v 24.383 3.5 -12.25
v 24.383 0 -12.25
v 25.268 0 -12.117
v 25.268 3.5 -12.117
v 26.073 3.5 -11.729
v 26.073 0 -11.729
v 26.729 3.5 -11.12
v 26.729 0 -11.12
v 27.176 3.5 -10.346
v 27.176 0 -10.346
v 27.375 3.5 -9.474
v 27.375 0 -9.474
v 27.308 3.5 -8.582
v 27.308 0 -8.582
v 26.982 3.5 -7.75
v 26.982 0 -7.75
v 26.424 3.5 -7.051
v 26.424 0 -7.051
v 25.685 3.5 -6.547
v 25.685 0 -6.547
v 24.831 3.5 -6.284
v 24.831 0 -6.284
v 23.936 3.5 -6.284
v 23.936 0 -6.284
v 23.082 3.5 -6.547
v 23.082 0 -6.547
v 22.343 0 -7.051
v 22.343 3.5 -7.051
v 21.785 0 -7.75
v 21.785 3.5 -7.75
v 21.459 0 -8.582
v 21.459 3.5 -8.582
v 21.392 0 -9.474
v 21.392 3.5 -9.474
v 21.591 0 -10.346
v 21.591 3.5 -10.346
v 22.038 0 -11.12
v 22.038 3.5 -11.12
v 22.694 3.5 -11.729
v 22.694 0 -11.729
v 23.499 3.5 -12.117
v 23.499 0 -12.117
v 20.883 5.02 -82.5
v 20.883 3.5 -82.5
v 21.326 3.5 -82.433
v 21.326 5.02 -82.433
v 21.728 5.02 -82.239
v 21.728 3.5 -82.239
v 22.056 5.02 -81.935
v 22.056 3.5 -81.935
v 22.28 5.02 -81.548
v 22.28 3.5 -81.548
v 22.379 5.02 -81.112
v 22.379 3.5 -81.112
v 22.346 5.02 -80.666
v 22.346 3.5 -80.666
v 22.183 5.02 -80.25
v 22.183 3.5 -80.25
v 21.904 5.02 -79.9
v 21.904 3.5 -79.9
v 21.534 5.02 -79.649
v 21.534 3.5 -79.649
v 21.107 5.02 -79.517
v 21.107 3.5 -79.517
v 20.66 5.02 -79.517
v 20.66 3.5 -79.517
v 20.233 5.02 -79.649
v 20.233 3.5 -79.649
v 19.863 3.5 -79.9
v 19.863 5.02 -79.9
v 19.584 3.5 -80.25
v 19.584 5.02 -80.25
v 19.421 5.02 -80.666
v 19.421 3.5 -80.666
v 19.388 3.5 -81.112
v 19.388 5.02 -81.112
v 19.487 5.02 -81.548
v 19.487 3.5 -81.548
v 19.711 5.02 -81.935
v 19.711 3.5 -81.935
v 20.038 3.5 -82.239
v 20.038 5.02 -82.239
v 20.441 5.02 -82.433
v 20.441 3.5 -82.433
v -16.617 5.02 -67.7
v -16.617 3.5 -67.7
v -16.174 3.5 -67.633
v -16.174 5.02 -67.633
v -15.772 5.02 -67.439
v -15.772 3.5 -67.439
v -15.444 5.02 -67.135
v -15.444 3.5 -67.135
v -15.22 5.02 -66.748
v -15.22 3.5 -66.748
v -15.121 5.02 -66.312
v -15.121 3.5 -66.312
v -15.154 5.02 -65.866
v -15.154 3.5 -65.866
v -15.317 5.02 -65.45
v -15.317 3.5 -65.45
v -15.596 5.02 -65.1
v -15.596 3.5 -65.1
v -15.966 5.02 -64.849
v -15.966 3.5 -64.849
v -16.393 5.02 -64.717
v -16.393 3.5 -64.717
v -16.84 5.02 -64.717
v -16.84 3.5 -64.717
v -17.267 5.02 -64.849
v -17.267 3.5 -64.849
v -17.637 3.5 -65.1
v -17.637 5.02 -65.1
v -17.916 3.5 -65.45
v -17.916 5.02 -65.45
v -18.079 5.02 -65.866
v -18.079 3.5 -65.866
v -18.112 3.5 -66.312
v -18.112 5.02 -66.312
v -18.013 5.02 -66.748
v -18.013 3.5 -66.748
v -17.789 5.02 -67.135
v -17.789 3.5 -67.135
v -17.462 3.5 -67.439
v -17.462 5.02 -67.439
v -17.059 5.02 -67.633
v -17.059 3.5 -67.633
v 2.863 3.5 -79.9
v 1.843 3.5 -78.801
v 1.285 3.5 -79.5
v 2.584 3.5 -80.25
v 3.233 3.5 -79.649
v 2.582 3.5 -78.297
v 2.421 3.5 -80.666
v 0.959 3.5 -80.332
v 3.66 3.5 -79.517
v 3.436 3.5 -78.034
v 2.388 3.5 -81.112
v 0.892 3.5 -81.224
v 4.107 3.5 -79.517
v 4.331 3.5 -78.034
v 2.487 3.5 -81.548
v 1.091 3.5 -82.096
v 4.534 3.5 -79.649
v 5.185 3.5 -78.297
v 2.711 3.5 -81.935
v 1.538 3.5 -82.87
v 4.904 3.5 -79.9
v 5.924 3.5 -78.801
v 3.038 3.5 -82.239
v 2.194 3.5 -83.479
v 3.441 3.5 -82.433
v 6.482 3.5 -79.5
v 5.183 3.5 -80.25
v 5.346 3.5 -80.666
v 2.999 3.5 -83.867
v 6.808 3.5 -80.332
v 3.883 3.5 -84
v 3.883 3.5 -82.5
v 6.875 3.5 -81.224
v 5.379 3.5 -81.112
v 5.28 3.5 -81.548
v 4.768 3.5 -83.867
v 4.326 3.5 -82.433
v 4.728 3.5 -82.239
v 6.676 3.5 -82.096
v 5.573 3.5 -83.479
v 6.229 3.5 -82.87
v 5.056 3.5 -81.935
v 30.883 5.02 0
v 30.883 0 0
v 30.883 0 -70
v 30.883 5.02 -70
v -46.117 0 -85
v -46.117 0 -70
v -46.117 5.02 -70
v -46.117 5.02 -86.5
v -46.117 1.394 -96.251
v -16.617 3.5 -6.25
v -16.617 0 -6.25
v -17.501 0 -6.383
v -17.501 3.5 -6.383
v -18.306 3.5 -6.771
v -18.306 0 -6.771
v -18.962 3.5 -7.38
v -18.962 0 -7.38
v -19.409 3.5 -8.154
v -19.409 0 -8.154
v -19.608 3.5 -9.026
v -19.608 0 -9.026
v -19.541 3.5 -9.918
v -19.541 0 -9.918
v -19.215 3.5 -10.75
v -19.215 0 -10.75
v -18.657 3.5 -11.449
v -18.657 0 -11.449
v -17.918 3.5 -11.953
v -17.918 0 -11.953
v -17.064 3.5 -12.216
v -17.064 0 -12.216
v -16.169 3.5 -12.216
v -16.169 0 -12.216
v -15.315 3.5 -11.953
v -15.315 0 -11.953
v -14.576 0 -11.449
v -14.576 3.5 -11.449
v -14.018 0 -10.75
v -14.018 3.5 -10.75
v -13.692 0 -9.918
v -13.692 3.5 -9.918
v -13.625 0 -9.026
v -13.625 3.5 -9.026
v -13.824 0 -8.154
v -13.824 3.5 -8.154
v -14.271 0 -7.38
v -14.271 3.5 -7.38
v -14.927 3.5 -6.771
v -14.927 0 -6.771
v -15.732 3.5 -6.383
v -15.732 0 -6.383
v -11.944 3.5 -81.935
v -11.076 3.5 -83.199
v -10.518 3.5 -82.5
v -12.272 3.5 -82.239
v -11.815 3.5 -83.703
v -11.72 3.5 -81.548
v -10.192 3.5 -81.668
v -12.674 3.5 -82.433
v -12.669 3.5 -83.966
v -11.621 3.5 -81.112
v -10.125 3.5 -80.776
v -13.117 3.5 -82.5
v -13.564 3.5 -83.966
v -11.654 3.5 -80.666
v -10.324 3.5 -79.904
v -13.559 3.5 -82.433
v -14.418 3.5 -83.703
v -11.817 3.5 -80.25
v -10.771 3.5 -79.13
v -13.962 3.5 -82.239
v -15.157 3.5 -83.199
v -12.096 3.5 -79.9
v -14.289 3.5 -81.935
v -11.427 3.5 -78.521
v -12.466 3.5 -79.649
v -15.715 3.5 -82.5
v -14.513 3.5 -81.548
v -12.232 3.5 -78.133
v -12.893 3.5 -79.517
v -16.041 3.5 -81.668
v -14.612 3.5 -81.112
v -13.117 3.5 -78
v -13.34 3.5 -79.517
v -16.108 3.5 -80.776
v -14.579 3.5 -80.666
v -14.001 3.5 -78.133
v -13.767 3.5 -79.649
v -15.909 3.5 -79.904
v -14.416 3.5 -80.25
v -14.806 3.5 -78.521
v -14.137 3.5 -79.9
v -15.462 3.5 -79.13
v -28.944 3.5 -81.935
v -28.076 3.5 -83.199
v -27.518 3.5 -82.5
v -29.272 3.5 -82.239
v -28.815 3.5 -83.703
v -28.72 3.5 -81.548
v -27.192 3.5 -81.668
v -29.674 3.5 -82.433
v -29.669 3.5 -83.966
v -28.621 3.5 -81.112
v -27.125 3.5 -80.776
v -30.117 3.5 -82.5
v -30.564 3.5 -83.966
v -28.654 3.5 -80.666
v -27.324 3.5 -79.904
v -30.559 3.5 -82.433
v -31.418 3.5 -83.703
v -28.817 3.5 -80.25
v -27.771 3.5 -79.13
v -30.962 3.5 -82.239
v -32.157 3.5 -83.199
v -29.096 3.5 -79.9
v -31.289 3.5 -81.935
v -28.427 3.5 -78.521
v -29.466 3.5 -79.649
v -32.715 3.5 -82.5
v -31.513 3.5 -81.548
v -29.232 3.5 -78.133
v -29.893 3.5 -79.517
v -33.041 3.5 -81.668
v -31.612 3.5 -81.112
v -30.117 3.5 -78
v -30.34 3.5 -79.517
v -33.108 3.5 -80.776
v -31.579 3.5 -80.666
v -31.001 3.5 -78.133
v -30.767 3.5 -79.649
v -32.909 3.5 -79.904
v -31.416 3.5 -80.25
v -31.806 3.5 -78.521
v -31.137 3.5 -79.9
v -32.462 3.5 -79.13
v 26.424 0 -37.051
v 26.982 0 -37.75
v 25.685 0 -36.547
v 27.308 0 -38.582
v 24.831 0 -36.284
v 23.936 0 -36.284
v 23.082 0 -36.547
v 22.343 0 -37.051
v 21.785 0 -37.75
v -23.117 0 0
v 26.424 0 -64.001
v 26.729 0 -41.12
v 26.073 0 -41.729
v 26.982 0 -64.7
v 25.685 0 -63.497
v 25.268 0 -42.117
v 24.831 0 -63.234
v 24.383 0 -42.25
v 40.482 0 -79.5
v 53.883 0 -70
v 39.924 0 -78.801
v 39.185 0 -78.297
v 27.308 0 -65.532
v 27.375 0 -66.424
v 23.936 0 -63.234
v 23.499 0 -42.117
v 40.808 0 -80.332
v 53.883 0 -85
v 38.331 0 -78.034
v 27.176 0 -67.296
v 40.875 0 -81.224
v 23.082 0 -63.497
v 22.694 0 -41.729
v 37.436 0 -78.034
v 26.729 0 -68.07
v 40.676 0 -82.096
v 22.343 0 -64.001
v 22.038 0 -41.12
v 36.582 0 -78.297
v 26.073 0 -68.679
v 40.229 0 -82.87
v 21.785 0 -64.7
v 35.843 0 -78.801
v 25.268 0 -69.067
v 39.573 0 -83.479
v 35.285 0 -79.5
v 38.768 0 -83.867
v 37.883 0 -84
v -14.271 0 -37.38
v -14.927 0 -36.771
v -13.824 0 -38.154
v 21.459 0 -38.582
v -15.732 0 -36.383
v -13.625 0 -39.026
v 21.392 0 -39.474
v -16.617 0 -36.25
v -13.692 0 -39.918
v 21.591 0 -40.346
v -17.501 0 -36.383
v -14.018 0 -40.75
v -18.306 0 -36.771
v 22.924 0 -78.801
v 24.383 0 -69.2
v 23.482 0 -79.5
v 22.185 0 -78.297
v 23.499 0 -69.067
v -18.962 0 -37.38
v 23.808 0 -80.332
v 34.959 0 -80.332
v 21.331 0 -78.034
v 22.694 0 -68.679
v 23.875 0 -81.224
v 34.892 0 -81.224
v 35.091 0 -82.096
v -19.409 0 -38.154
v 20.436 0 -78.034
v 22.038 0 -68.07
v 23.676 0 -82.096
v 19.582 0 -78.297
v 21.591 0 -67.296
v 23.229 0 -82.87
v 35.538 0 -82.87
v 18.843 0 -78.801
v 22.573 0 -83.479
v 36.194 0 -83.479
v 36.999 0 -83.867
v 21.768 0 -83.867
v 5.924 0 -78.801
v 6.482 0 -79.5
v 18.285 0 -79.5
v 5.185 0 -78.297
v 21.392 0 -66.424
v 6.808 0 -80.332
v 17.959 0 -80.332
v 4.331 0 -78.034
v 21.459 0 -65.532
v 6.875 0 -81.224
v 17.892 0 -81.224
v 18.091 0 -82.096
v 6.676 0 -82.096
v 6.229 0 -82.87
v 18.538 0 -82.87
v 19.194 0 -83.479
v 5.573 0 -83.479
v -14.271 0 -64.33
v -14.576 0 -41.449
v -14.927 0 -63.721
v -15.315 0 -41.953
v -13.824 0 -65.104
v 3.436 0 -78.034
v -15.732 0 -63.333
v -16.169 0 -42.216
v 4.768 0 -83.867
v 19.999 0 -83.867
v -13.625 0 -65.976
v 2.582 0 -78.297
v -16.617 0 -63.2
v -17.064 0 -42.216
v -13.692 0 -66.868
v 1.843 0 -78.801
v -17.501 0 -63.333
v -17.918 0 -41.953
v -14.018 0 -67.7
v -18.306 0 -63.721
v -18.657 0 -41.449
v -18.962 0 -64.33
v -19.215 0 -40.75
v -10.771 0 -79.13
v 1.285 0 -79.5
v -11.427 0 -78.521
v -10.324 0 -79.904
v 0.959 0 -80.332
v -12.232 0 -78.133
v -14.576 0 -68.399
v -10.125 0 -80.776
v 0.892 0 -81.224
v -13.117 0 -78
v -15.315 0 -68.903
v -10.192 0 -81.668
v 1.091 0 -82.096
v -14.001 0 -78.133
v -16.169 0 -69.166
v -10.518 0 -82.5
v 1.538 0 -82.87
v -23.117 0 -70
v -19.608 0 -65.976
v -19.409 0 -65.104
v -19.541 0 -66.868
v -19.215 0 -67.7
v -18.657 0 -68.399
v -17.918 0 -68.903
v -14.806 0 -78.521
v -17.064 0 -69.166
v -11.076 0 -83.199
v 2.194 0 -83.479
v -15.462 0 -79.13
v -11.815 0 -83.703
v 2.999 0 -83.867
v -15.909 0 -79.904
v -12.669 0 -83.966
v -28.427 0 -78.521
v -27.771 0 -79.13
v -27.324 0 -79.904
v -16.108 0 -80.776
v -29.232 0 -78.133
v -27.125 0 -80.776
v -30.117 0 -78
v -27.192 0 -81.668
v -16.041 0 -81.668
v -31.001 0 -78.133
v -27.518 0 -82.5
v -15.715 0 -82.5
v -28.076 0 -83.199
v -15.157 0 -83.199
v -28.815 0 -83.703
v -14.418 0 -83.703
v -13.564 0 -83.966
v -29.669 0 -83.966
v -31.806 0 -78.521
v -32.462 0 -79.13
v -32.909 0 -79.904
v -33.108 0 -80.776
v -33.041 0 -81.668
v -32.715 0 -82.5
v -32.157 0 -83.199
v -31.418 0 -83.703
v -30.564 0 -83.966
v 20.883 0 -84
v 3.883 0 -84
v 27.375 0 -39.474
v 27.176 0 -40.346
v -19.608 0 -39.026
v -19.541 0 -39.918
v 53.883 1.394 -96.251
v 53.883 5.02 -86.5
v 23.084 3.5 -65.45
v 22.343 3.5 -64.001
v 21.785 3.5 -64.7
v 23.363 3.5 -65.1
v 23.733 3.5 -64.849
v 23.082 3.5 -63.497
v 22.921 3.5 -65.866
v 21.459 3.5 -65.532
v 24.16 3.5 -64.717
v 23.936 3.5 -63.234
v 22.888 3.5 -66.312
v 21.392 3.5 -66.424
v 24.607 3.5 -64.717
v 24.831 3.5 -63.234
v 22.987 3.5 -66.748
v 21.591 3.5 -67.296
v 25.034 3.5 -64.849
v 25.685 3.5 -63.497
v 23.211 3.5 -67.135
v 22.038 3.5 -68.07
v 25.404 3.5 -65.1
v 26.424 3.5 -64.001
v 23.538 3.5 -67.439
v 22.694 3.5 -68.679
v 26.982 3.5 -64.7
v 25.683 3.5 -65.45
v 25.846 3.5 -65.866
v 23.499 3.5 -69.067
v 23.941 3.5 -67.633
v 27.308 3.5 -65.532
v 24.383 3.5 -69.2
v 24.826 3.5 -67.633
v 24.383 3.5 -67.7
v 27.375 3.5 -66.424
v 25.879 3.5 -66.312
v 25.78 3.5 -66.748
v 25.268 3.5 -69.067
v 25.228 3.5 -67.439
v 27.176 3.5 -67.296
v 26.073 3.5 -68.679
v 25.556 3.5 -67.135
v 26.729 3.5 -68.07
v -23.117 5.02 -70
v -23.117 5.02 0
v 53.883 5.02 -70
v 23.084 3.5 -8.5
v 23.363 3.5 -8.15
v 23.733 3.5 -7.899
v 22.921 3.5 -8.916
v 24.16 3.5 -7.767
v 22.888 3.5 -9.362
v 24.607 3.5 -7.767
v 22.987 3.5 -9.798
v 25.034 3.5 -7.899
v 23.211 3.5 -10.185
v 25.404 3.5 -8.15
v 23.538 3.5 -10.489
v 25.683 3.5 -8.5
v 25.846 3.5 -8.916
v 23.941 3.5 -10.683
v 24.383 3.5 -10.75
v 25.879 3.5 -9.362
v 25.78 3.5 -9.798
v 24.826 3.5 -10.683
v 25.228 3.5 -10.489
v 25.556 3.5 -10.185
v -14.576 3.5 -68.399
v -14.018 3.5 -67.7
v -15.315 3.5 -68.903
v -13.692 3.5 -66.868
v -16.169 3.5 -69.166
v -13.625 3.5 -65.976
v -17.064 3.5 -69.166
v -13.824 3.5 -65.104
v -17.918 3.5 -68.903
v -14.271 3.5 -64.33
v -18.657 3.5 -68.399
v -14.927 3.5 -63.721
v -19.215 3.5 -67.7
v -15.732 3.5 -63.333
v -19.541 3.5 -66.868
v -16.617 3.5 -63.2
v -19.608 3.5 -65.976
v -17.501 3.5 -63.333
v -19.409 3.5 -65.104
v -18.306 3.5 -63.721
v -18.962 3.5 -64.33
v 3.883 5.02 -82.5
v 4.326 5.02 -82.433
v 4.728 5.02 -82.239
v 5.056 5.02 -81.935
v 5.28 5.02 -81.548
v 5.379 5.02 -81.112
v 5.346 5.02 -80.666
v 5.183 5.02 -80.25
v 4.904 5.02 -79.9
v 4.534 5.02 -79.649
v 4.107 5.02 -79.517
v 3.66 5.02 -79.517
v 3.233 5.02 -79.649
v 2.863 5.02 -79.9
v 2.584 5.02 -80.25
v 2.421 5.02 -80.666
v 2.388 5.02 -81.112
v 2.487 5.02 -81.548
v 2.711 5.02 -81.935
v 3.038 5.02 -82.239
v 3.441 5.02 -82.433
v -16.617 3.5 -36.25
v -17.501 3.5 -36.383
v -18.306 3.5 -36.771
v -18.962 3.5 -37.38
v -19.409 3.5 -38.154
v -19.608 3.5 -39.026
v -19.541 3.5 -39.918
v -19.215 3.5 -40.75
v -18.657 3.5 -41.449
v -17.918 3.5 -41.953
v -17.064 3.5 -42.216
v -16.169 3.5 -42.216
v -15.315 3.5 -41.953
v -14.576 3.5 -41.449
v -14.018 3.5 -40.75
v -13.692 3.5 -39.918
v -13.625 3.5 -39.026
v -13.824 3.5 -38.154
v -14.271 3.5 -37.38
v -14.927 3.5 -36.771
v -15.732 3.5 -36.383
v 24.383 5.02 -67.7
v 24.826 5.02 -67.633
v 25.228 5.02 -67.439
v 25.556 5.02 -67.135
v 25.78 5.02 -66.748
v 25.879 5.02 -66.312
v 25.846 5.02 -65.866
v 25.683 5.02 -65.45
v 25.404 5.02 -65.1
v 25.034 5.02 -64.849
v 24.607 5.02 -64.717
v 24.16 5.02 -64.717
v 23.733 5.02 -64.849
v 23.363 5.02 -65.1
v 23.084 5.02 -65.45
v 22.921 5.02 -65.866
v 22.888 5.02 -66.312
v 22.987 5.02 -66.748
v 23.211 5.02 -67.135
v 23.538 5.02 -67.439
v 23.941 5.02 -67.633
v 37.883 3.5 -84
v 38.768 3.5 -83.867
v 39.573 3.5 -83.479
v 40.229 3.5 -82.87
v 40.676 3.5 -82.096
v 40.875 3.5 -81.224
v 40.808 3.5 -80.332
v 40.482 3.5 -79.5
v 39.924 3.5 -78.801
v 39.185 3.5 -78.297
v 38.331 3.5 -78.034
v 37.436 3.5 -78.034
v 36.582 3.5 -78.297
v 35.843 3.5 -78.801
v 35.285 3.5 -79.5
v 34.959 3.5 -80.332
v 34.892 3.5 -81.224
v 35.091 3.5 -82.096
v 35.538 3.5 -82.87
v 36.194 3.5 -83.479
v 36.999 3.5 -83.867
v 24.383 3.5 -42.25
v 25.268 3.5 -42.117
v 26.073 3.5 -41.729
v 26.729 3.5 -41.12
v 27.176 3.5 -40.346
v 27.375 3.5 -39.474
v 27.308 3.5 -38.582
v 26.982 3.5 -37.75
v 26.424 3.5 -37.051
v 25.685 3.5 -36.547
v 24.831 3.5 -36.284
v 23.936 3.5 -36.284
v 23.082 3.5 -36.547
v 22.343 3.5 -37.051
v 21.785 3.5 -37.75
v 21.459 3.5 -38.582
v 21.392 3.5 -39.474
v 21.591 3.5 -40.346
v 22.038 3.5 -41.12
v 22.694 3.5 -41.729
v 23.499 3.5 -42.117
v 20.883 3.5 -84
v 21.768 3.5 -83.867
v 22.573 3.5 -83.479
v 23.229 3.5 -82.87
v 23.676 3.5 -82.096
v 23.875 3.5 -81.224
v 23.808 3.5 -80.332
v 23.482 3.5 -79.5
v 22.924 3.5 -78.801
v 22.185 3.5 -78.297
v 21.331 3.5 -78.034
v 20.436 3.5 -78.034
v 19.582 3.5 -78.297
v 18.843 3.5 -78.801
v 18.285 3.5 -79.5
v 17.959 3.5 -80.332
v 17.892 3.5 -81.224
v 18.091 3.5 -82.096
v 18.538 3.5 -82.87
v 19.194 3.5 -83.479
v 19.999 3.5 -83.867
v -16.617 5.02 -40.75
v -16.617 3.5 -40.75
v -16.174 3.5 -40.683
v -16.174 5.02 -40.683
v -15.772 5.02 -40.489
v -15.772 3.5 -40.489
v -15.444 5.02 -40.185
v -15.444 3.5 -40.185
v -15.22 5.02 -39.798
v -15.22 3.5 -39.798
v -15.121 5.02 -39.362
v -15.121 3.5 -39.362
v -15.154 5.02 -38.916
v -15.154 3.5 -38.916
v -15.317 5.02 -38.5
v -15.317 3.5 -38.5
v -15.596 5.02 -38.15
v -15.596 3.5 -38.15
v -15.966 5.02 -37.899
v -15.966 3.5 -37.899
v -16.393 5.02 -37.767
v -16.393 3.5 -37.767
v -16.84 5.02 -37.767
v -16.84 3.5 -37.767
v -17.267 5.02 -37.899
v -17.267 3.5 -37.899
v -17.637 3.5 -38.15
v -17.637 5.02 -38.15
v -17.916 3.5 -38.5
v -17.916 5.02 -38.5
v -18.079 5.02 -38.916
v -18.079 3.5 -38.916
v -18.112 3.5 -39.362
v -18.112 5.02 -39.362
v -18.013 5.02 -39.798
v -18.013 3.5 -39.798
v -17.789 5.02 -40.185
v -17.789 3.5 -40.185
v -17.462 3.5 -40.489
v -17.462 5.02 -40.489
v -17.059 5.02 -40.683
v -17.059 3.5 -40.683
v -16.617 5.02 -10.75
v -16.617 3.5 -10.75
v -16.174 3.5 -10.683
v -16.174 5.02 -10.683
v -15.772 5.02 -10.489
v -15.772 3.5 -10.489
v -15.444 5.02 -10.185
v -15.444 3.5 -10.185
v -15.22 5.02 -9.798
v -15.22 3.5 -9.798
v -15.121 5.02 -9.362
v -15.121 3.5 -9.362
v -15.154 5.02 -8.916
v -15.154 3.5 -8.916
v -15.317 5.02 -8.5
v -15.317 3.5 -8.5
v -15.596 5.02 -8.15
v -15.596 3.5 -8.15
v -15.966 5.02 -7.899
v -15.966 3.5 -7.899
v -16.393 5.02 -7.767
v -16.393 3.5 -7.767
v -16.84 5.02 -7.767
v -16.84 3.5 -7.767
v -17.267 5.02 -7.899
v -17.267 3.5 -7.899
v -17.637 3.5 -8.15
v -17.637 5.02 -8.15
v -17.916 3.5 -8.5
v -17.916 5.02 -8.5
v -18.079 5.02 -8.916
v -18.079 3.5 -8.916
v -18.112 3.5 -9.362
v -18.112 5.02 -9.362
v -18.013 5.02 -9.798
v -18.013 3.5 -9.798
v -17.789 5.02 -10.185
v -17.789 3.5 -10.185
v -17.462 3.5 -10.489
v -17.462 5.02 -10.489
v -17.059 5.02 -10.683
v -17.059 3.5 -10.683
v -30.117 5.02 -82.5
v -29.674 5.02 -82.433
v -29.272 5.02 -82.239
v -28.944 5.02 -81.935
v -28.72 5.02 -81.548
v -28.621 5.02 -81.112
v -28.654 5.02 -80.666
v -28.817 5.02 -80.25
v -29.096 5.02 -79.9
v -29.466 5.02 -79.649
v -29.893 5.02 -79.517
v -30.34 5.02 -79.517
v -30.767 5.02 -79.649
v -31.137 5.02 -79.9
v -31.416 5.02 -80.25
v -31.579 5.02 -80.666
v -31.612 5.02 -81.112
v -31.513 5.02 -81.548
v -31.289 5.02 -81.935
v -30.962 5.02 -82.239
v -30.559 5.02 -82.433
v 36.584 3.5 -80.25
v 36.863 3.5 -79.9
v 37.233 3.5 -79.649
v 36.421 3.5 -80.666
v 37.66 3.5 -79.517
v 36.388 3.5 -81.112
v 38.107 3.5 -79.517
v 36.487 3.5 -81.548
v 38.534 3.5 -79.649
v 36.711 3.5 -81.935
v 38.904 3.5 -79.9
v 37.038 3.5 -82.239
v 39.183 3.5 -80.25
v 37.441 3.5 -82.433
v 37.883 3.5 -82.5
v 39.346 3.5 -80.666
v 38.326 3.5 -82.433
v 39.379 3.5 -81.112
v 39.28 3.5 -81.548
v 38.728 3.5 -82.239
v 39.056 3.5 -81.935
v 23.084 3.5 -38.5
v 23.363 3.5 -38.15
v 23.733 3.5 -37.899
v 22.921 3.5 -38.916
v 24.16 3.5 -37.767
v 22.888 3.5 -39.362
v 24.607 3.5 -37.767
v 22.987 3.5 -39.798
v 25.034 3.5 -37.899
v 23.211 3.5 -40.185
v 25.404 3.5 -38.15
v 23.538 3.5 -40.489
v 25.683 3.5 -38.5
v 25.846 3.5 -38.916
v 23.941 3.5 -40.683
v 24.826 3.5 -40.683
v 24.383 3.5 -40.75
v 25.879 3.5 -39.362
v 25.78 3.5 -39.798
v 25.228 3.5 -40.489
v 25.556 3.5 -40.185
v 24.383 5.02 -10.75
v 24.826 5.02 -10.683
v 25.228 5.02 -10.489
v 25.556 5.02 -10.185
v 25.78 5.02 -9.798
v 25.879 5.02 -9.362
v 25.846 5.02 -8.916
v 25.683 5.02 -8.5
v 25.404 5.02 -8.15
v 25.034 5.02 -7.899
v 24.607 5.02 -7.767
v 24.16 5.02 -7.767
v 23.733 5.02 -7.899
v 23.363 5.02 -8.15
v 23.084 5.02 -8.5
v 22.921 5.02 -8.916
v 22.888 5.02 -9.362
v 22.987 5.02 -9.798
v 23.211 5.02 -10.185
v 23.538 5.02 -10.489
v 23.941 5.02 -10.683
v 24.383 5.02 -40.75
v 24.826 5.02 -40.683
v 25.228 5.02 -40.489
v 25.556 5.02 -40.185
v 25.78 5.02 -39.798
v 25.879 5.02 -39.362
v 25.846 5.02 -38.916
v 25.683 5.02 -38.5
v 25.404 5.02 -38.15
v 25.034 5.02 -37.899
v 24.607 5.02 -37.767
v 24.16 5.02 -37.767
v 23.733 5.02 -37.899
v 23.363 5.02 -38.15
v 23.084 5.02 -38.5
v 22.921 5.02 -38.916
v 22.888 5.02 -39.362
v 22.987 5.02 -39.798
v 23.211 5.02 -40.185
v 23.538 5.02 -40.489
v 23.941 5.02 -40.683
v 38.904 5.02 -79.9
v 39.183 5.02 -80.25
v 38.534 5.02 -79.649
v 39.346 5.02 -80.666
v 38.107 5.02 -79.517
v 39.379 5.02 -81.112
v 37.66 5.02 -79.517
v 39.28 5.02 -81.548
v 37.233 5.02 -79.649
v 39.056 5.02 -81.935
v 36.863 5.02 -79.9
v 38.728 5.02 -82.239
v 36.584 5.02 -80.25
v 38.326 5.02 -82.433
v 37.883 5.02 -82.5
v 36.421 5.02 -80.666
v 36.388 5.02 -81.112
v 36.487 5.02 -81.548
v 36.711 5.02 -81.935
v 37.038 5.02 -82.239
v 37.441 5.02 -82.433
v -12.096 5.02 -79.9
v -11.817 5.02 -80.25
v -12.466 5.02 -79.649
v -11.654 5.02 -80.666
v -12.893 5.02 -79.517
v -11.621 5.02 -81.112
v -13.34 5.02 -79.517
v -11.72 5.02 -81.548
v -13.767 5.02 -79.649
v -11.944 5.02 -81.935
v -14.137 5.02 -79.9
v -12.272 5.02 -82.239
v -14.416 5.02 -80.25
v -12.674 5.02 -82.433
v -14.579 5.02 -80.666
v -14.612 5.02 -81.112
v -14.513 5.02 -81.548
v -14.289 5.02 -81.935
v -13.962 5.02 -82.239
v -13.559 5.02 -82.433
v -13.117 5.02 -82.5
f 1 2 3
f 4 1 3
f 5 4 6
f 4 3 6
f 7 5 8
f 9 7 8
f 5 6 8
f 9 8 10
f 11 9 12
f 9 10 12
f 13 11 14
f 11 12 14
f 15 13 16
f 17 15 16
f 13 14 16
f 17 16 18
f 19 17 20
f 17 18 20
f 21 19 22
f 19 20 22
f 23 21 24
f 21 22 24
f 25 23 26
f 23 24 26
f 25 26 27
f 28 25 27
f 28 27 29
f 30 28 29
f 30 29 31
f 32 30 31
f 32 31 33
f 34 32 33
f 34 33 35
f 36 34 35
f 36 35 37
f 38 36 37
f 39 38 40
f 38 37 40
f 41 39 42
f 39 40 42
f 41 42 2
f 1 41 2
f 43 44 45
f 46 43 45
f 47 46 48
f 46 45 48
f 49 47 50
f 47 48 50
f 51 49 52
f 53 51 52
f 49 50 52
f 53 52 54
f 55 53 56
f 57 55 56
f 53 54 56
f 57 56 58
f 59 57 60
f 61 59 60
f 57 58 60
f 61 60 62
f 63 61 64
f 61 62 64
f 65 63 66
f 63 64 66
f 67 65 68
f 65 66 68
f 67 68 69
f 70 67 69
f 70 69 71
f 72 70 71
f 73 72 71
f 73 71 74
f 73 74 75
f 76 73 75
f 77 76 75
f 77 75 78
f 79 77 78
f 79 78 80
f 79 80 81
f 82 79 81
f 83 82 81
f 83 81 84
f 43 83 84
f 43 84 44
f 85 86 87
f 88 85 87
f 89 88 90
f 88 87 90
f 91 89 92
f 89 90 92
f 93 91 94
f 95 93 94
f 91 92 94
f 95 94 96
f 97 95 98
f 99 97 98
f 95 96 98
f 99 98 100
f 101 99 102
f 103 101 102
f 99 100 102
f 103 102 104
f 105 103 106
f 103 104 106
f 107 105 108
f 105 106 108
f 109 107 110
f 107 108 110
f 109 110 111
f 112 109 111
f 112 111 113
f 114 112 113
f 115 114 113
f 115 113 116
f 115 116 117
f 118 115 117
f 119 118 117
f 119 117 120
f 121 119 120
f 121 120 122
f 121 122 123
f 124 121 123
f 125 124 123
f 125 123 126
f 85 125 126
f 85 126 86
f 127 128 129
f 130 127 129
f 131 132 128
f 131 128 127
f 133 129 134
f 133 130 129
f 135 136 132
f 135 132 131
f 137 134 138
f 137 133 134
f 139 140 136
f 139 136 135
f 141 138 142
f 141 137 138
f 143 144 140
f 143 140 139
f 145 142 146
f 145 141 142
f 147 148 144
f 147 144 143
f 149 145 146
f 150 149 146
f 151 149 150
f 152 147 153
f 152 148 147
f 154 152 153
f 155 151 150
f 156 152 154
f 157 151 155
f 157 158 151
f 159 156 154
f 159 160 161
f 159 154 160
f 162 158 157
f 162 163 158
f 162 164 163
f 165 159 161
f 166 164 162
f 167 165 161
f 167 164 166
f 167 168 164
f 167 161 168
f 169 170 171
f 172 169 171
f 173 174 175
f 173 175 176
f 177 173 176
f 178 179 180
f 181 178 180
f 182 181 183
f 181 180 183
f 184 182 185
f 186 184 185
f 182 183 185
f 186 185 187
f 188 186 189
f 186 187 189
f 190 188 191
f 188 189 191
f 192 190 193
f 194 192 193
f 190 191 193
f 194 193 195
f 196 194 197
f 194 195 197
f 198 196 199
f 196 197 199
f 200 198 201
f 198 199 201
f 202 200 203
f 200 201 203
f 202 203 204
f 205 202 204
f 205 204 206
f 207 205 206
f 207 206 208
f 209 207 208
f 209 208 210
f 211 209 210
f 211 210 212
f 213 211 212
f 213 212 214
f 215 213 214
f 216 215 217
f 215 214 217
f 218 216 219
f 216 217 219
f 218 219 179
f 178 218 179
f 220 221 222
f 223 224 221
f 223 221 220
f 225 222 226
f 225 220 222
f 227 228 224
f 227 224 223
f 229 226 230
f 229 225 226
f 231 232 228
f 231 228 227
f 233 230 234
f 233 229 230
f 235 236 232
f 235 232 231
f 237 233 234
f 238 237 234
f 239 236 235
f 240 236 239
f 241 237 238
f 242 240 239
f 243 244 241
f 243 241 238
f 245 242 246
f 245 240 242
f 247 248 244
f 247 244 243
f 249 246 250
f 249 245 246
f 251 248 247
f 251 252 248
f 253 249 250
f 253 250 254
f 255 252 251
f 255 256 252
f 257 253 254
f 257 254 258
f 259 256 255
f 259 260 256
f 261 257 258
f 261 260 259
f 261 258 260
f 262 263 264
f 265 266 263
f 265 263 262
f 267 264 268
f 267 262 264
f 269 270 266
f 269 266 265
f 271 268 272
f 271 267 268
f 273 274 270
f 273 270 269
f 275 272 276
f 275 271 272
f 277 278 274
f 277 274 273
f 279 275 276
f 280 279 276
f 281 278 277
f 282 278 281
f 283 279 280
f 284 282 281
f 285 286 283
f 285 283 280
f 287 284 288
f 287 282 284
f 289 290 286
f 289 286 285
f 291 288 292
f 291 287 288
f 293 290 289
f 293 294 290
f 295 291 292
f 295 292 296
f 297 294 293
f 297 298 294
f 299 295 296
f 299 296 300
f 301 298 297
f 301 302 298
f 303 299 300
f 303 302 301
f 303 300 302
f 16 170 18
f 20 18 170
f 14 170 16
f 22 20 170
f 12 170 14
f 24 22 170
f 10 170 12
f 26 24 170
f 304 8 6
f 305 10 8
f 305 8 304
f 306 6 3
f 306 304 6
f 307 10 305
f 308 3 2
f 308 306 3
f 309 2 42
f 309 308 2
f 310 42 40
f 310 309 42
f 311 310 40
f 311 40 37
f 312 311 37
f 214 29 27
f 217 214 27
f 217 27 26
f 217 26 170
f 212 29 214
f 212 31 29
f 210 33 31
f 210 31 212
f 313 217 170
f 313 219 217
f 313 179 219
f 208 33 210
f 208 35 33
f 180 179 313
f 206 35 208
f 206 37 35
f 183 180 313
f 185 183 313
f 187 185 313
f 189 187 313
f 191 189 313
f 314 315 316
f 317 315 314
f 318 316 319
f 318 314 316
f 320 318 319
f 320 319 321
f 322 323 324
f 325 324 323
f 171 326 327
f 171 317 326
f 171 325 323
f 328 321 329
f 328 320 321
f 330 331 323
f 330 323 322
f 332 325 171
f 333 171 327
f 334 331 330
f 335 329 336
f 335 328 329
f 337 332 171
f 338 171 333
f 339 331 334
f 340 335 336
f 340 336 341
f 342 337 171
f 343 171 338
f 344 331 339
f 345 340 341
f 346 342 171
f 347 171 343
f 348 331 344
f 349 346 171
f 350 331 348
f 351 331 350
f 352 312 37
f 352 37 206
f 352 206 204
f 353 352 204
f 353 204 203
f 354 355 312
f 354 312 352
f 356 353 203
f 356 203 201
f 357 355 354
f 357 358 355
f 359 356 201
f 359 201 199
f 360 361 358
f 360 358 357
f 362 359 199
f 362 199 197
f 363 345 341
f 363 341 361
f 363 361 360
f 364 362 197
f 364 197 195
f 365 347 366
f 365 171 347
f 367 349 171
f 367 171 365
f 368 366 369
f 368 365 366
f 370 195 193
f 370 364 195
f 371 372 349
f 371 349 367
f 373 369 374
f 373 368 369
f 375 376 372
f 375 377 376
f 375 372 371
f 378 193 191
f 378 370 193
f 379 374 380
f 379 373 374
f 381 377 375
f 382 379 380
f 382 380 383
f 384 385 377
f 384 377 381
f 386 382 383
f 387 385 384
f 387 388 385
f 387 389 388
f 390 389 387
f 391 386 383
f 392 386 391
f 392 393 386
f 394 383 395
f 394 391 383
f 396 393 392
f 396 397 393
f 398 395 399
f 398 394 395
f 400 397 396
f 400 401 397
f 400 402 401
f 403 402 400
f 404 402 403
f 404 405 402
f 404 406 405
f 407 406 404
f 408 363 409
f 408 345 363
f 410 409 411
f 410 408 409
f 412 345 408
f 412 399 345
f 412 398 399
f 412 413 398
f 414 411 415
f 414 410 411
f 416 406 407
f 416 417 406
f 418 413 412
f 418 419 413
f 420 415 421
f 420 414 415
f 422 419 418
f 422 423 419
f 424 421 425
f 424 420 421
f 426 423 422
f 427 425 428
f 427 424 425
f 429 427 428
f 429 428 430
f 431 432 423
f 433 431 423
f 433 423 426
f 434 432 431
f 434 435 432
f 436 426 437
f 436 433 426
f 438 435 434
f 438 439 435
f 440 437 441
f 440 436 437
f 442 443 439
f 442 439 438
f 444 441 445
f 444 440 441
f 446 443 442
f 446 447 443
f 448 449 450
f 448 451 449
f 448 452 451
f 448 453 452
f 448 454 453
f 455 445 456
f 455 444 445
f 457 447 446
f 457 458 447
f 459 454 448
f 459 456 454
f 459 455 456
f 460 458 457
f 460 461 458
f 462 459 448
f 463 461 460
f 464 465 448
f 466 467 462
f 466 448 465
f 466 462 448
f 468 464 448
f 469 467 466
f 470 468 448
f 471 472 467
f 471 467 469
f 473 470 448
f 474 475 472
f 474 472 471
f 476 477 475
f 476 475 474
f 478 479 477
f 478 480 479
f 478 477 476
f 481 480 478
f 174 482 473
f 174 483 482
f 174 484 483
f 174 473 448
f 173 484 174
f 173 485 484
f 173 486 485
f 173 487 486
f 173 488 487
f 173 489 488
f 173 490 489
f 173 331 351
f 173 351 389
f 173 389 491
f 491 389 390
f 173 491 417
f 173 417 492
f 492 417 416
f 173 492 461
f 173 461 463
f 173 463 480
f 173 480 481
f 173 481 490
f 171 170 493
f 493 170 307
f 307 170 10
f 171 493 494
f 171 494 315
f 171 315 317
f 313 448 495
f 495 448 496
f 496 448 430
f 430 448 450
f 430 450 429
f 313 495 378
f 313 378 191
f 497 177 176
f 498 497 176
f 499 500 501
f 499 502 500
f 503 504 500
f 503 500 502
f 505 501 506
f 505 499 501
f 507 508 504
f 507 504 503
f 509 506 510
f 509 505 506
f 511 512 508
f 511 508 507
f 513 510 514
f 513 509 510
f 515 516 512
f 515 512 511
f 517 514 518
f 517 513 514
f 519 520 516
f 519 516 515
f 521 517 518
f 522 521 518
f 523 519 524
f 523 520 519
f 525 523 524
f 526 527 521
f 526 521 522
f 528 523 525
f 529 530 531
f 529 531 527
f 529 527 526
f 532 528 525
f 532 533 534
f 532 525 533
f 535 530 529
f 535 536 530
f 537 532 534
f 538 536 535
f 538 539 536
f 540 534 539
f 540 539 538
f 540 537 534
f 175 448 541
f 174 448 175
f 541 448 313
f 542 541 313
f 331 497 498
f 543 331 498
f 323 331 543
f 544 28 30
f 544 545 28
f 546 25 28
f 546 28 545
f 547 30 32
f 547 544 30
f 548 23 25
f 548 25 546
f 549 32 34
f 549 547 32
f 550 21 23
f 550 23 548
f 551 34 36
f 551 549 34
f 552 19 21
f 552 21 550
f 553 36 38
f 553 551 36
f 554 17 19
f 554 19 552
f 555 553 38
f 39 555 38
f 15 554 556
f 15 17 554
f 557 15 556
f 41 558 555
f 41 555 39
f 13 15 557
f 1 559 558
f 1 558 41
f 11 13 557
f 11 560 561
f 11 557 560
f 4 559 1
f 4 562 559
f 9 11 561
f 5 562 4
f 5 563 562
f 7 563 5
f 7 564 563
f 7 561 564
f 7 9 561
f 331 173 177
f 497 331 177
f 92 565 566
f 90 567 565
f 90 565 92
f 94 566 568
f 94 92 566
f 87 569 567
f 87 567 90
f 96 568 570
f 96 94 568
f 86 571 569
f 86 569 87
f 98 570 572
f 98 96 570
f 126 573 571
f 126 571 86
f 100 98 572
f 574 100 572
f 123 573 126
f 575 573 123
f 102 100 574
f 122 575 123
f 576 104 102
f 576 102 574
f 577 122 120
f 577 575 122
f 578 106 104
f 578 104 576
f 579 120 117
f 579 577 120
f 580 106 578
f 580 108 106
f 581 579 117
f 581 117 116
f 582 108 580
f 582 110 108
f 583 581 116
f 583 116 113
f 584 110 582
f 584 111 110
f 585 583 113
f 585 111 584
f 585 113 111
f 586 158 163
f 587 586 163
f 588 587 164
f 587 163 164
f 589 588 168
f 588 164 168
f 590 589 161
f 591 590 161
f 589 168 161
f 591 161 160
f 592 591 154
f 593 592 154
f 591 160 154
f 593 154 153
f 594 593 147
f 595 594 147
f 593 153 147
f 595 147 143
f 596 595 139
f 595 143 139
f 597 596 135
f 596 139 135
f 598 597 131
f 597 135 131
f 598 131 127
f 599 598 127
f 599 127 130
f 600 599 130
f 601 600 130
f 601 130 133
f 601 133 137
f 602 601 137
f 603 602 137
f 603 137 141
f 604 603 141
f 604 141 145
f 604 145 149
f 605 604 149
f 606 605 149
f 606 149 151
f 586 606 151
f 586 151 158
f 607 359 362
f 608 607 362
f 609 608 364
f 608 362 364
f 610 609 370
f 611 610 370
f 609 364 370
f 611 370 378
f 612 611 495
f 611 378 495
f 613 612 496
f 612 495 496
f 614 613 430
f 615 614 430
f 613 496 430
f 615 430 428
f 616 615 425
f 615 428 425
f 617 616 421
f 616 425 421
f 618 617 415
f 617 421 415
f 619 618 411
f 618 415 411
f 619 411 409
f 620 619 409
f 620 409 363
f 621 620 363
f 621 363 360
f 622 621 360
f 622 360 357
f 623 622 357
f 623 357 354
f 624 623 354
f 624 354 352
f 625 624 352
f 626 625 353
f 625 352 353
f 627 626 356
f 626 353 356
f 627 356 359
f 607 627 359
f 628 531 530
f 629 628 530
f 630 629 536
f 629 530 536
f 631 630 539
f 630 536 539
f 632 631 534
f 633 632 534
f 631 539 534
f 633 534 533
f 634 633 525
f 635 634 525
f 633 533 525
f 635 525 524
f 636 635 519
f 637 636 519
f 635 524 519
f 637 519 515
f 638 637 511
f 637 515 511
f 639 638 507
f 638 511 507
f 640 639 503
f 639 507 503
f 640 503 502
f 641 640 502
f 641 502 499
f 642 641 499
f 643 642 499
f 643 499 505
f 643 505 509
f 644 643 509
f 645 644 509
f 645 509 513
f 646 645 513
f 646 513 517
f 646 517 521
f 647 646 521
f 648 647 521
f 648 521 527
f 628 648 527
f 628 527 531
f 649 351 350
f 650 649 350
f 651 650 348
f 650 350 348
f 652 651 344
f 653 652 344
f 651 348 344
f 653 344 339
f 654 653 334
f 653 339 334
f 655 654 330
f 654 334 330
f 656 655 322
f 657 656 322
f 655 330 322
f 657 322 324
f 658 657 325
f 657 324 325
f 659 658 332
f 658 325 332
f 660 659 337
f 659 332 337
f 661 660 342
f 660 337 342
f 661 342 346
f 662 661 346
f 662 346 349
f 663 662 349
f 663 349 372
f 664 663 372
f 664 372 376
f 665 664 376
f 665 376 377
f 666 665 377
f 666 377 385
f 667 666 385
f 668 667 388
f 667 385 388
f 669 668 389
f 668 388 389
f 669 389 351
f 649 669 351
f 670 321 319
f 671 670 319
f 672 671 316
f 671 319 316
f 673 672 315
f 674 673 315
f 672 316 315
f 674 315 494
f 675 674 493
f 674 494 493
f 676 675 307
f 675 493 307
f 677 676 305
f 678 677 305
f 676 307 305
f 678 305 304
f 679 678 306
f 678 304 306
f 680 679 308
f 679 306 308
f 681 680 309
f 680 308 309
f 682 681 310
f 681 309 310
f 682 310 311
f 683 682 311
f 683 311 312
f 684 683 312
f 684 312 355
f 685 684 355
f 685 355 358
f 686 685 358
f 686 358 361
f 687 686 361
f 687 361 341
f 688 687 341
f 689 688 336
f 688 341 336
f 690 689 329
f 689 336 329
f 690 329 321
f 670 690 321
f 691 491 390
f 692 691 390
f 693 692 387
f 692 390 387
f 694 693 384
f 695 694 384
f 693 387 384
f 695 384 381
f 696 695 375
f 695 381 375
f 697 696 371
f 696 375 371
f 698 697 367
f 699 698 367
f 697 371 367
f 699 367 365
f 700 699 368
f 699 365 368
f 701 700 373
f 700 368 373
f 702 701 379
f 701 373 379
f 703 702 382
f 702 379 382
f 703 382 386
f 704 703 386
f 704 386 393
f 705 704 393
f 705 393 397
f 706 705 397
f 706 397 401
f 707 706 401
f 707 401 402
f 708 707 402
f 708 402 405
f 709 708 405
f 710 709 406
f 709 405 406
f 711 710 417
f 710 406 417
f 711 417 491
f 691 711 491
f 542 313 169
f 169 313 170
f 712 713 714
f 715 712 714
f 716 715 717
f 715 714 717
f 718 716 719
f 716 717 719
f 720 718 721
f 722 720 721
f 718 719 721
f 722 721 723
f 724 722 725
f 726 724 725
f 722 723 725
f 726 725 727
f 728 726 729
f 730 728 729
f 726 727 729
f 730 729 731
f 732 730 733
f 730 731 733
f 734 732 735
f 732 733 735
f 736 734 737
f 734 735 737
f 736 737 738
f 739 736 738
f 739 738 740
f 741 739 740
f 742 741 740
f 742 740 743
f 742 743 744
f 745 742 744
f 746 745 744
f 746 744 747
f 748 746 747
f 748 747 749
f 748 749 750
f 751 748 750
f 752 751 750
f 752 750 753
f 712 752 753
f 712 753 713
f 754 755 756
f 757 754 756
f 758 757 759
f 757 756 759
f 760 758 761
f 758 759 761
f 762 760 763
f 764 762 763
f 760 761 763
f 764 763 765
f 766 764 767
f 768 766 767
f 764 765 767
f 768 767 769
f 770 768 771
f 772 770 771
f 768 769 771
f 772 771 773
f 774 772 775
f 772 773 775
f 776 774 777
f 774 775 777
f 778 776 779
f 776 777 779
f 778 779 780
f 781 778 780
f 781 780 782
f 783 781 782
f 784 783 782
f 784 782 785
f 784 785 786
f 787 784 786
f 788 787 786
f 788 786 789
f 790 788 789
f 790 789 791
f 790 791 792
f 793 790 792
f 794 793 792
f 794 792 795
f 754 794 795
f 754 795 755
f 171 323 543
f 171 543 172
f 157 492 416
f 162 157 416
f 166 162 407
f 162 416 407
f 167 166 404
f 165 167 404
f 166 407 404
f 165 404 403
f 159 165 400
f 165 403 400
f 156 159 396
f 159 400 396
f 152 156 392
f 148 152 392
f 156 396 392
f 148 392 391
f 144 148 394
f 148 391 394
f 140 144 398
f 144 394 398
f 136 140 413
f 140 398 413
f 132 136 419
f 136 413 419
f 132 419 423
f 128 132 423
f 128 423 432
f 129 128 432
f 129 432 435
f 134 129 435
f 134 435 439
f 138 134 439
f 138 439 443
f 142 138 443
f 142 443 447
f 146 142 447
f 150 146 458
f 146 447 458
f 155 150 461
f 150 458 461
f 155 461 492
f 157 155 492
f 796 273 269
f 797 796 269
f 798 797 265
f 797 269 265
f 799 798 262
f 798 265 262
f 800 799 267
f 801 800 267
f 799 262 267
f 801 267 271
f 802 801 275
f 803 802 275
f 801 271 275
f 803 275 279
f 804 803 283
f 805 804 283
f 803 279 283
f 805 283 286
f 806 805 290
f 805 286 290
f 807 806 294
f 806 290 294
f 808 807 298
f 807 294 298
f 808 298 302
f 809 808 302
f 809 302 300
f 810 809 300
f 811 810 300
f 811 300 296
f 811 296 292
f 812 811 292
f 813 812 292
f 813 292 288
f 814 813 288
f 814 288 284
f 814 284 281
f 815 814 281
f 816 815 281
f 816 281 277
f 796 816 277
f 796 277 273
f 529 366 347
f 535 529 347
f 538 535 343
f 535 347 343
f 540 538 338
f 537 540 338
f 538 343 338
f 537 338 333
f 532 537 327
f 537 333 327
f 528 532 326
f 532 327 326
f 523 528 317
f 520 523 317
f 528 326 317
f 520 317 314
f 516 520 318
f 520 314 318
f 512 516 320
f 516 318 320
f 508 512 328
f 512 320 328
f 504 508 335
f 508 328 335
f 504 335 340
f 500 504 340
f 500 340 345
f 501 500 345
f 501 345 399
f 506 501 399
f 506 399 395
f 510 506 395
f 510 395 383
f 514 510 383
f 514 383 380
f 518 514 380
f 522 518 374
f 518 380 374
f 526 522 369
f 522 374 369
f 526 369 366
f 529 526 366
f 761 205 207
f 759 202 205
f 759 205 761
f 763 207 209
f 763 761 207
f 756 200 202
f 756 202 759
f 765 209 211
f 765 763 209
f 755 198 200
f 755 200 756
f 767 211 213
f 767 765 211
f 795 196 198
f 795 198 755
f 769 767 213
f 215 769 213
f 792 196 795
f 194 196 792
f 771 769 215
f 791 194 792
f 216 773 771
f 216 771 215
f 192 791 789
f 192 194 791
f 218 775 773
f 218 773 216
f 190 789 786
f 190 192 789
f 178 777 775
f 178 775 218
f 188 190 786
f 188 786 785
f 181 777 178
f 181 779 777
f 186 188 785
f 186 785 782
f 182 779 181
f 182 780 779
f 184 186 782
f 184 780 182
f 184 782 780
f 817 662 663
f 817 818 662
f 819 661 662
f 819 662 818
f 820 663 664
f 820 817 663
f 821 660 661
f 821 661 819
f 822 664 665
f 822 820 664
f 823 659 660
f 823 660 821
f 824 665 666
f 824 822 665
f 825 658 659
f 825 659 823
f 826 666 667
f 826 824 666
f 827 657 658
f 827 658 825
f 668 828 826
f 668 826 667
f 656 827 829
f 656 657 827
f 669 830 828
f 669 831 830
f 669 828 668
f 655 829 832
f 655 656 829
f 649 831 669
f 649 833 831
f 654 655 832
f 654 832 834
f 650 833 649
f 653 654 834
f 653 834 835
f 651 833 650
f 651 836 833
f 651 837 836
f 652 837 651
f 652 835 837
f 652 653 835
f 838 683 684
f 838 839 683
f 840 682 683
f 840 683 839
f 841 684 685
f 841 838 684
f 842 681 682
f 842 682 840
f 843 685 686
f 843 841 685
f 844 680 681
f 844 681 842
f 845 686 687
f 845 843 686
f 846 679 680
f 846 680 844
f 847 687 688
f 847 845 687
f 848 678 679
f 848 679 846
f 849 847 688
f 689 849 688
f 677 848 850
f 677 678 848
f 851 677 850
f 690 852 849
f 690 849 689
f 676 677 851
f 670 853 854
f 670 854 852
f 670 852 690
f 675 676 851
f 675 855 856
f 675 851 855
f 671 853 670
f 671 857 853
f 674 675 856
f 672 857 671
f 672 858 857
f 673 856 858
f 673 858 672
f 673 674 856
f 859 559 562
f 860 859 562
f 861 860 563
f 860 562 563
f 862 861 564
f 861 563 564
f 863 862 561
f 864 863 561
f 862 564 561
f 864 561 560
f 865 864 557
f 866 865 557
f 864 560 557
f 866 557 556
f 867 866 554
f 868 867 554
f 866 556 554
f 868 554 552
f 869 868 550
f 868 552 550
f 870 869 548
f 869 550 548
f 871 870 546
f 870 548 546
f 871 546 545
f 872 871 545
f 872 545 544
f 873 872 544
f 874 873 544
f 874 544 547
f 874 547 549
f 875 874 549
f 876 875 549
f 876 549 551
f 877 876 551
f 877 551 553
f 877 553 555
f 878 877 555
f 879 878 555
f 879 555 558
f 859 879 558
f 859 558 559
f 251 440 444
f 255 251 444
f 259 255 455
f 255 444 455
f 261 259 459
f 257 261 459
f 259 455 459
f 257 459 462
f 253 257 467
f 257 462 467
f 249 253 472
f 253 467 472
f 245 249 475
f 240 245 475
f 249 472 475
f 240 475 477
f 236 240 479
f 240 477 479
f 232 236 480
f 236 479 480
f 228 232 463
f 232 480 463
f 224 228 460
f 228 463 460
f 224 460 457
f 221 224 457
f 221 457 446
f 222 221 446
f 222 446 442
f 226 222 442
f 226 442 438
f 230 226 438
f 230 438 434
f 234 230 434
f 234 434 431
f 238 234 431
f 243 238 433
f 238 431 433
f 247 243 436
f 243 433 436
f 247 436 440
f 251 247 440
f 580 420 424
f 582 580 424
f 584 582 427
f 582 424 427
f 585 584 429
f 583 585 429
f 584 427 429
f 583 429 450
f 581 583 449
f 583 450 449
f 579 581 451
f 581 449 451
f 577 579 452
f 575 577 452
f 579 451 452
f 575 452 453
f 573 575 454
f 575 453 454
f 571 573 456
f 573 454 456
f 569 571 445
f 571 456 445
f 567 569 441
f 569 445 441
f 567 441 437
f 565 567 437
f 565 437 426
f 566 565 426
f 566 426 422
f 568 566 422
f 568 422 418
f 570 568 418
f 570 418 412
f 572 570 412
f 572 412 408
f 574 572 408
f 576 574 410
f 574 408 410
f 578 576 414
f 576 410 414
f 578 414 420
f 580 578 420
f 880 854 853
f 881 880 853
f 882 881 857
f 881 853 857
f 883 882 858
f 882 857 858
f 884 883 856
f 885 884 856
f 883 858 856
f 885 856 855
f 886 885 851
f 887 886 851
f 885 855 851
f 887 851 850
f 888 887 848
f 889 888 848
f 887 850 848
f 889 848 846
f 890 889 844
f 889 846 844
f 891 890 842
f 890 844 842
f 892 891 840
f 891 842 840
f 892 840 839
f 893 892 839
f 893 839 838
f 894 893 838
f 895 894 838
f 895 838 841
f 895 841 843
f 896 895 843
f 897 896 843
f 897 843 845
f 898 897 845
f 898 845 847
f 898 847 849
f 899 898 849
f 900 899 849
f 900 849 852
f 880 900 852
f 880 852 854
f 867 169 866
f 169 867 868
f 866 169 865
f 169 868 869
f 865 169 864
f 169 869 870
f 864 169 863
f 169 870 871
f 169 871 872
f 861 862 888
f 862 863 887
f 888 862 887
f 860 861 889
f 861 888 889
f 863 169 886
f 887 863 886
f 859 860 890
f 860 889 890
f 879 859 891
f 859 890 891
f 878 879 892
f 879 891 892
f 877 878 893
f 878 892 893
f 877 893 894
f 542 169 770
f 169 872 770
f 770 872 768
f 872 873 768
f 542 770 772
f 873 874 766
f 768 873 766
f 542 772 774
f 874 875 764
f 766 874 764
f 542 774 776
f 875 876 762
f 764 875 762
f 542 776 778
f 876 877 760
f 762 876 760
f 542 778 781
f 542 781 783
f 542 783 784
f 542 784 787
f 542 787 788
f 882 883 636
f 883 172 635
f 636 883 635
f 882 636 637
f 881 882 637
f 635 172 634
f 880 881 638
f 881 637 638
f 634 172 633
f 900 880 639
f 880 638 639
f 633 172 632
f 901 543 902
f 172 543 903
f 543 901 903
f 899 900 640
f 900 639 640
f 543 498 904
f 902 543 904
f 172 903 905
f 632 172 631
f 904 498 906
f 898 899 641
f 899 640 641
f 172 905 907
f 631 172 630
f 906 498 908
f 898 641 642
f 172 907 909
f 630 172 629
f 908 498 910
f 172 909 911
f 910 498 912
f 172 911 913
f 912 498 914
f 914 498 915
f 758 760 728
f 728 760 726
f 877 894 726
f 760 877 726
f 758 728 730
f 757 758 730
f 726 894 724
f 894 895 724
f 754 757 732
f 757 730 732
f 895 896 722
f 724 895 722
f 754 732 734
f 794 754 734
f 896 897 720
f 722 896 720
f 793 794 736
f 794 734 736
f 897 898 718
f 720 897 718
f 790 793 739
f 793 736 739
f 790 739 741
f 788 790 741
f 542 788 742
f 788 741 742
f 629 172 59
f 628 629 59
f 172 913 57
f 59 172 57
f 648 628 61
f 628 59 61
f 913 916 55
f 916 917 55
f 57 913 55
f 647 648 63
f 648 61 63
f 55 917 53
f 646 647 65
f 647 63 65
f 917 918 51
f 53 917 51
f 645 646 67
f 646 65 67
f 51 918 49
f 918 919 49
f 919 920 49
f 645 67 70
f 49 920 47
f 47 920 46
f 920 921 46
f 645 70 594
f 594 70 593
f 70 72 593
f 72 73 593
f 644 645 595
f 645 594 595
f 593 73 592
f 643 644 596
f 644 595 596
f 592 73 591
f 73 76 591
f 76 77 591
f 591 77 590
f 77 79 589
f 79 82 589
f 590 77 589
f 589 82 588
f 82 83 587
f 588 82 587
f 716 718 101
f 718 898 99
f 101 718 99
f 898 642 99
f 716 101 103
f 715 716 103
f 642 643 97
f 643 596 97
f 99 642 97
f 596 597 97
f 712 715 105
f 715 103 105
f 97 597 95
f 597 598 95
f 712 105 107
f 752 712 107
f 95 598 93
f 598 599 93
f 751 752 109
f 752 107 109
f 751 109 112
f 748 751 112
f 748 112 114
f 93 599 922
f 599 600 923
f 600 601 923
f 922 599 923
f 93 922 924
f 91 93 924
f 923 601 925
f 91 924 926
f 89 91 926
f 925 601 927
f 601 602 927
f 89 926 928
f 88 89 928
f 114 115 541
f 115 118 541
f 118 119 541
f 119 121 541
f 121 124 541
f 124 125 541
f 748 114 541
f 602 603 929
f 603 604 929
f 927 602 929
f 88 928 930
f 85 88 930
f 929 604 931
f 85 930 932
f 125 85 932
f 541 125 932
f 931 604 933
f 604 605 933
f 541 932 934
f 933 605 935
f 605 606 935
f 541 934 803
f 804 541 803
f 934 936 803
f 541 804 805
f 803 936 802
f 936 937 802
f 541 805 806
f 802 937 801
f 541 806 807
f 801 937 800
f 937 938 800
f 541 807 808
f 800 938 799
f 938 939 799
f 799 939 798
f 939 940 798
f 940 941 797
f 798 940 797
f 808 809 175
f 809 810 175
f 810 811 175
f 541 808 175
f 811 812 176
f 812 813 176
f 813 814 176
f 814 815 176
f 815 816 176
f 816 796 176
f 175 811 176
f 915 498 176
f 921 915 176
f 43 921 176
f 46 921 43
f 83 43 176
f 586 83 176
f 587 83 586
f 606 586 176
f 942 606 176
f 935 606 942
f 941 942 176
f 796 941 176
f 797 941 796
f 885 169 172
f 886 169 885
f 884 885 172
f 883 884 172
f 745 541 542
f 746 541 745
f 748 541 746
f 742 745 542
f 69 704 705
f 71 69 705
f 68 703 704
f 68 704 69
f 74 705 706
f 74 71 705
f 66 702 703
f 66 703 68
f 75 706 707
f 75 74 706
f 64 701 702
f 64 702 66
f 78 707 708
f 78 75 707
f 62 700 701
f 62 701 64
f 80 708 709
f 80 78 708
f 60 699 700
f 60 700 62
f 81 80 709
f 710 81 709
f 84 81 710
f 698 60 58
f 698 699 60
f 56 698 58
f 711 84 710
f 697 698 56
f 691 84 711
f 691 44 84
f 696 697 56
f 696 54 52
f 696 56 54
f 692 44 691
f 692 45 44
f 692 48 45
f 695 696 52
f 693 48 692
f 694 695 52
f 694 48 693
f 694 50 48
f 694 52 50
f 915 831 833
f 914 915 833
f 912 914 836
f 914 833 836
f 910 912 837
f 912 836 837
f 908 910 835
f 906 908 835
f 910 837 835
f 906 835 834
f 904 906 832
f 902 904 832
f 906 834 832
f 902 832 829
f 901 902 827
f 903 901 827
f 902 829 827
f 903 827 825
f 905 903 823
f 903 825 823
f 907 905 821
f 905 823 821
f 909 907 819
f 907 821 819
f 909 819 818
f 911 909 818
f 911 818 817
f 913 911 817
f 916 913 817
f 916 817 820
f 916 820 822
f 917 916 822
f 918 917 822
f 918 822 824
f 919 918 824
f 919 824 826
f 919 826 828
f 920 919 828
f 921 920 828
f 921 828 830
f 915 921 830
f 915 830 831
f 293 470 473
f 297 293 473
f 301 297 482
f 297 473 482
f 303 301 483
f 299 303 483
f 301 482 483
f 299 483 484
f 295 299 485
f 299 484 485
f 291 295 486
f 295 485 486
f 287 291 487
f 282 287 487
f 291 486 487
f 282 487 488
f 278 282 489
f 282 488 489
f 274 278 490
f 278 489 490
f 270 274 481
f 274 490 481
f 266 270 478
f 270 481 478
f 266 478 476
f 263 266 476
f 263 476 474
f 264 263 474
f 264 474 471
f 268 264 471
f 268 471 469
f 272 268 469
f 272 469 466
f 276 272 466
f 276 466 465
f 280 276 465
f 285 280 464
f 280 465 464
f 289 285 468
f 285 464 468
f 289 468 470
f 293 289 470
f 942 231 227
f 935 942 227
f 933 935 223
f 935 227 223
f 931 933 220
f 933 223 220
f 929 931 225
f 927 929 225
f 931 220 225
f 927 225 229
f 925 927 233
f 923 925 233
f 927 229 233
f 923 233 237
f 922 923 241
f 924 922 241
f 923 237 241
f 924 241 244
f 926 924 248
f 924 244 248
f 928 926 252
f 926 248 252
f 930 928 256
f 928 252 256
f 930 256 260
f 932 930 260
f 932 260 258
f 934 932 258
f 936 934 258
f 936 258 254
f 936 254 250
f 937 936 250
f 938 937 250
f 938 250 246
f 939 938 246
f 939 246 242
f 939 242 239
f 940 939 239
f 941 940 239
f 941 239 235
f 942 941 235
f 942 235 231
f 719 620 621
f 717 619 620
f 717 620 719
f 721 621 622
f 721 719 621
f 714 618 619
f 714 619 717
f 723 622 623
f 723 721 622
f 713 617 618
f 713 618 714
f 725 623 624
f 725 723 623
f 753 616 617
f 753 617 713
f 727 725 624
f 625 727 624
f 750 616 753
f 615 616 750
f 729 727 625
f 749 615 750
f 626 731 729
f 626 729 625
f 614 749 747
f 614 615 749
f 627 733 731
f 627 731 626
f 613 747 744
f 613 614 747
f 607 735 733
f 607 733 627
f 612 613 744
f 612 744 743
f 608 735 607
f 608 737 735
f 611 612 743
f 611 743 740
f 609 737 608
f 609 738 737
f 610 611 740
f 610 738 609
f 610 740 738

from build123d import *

# Parameters (mm, degrees)
SALIENTE_EXTRUIR1_DEPTH = 5.02
CORTAR_EXTRUIR1_DEPTH   = 100
CROQUIS4_R              = 1.5
CORTAR_EXTRUIR2_DEPTH   = 10
CROQUIS5_R              = 3
CORTAR_EXTRUIR3_DEPTH   = 3.5
CORTAR_EXTRUIR4_DEPTH   = 100


with BuildPart() as part:
    # Croquis1 → Saliente-Extruir1 (new body)
    with BuildSketch(Plane(origin=(0, 0, 0), x_dir=(1, 0, 0), z_dir=(0, 1, 0))):
        Polygon((-46.116523403, 70), (-46.116523403, 100), (53.883476597, 100), (53.883476597, 70), (30.883476597, 70), (30.883476597, 40), (30.883476597, 0), (26.883476597, 0), (-19.116523403, 0), (-23.116523403, 0), (-23.116523403, 40), (-23.116523403, 70), align=None)
    extrude(amount=SALIENTE_EXTRUIR1_DEPTH)

    # Croquis2 → Cortar-Extruir1 (cut)
    with BuildSketch(Plane.ZY.offset(46.116523403)):
        Polygon((-100, 0), (-86.5, 5.02), (-100, 5.02), align=None)
    extrude(amount=-CORTAR_EXTRUIR1_DEPTH, mode=Mode.SUBTRACT)

    # Croquis4 → Cortar-Extruir2 (cut)
    with BuildSketch(Plane.XZ):
        with Locations(Location((3.883476597, -81, 0), (0, 0, 270))):
            Circle(CROQUIS4_R)
        with Locations(Location((24.383476597, -9.25, 0), (0, 0, 270))):
            Circle(CROQUIS4_R)
        with Locations(Location((-30.116523403, -81, 0), (0, 0, 270))):
            Circle(CROQUIS4_R)
        with Locations(Location((-13.116523403, -81, 0), (0, 0, 270))):
            Circle(CROQUIS4_R)
        with Locations(Location((24.383476597, -66.2, 0), (0, 0, 270))):
            Circle(CROQUIS4_R)
        with Locations(Location((24.383476597, -39.25, 0), (0, 0, 270))):
            Circle(CROQUIS4_R)
        with Locations(Location((-16.616523403, -9.25, 0), (0, 0, 270))):
            Circle(CROQUIS4_R)
        with Locations(Location((-16.616523403, -39.25, 0), (0, 0, 270))):
            Circle(CROQUIS4_R)
        with Locations(Location((-16.616523403, -66.2, 0), (0, 0, 270))):
            Circle(CROQUIS4_R)
        with Locations(Location((20.883476597, -81, 0), (0, 0, 270))):
            Circle(CROQUIS4_R)
        with Locations(Location((37.883476597, -81, 0), (0, 0, 270))):
            Circle(CROQUIS4_R)
    extrude(amount=-CORTAR_EXTRUIR2_DEPTH, mode=Mode.SUBTRACT)

    # Croquis5 → Cortar-Extruir3 (cut)
    with BuildSketch(Plane.XZ):
        with Locations(Location((24.383476597, -9.25, 0), (0, 0, 270))):
            Circle(CROQUIS5_R)
        with Locations(Location((24.383476597, -39.25, 0), (0, 0, 270))):
            Circle(CROQUIS5_R)
        with Locations(Location((24.383476597, -66.2, 0), (0, 0, 270))):
            Circle(CROQUIS5_R)
        with Locations(Location((-16.616523403, -66.2, 0), (0, 0, 90))):
            Circle(CROQUIS5_R)
        with Locations(Location((-16.616523403, -39.25, 0), (0, 0, 90))):
            Circle(CROQUIS5_R)
        with Locations(Location((-16.616523403, -9.25, 0), (0, 0, 90))):
            Circle(CROQUIS5_R)
        with Locations(Location((3.883476597, -81, 0), (0, 0, 270))):
            Circle(CROQUIS5_R)
        with Locations(Location((20.883476597, -81, 0), (0, 0, 270))):
            Circle(CROQUIS5_R)
        with Locations(Location((37.883476597, -81, 0), (0, 0, 270))):
            Circle(CROQUIS5_R)
        with Locations(Location((-30.116523403, -81, 0), (0, 0, 90))):
            Circle(CROQUIS5_R)
        with Locations(Location((-13.116523403, -81, 0), (0, 0, 90))):
            Circle(CROQUIS5_R)
    extrude(amount=-CORTAR_EXTRUIR3_DEPTH, mode=Mode.SUBTRACT)

    # Croquis6 → Cortar-Extruir4 (cut)
    with BuildSketch(Plane.ZY.offset(46.116523403)):
        Polygon((-100, 0), (-85, 0), (-96.250817152, 1.394140585), align=None)
    extrude(amount=-CORTAR_EXTRUIR4_DEPTH, mode=Mode.SUBTRACT)


solid = part.part
